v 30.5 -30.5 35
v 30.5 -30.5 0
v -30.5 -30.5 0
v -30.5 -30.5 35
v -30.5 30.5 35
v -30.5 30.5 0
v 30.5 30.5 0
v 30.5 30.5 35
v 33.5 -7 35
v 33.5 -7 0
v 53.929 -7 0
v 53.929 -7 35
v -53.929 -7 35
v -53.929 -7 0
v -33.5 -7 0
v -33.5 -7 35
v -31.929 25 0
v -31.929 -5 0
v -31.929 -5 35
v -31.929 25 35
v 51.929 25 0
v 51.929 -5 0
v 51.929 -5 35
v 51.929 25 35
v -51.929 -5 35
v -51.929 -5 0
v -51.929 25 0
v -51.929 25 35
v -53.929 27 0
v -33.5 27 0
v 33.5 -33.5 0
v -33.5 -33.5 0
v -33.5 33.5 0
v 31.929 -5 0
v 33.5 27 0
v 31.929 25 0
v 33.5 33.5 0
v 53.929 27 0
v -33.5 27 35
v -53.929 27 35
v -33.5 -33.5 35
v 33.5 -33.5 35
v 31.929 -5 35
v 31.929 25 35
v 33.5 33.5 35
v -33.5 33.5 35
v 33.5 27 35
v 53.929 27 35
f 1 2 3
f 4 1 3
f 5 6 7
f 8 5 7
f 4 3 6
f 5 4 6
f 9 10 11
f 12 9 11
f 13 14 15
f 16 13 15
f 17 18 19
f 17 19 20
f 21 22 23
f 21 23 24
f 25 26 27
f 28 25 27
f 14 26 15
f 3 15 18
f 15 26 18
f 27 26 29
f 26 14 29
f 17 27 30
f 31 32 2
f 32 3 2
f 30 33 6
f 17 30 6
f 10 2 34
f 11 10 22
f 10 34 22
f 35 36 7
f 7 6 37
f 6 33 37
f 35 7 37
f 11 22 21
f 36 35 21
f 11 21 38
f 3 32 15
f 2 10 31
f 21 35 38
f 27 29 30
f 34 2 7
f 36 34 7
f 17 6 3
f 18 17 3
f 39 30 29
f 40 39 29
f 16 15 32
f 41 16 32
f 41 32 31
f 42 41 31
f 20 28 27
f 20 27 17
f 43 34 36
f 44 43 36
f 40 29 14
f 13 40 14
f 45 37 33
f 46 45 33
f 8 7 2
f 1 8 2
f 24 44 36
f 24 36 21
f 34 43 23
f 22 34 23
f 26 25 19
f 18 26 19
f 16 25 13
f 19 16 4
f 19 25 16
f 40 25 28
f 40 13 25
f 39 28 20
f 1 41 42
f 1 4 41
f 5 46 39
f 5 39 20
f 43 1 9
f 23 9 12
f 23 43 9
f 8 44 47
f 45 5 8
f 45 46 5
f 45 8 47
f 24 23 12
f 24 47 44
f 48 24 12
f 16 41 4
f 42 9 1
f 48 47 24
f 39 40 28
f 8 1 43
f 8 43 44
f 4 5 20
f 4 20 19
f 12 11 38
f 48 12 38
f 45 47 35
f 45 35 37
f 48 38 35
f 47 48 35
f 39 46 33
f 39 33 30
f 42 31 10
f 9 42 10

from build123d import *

# Parameters (mm, degrees)
F0_W     = 20
F0_H     = 30
F1_DEPTH = 35


with BuildPart() as f1:
    # F0 (on Top) → F1 (new body)
    with BuildSketch(Plane.XY):
        Polygon((-33.5, -7), (-30.5, -7), (-30.5, 27), (-33.5, 27), (-53.929, 27), (-53.929, -7), align=None)
        with Locations((-41.929, 10)):
            Rectangle(F0_W, F0_H, mode=Mode.SUBTRACT)
        Polygon((30.5, 30.5), (30.5, 27), (33.5, 27), (33.5, 33.5), (-33.5, 33.5), (-33.5, 27), (-30.5, 27), (-30.5, 30.5), align=None)
        Polygon((30.5, 27), (30.5, -7), (33.5, -7), (53.929, -7), (53.929, 27), (33.5, 27), align=None)
        with Locations((41.929, 10)):
            Rectangle(F0_W, F0_H, mode=Mode.SUBTRACT)
        Polygon((30.5, -7), (30.5, -30.5), (-30.5, -30.5), (-30.5, -7), (-33.5, -7), (-33.5, -33.5), (33.5, -33.5), (33.5, -7), align=None)
    extrude(amount=F1_DEPTH)


solid = f1.part
